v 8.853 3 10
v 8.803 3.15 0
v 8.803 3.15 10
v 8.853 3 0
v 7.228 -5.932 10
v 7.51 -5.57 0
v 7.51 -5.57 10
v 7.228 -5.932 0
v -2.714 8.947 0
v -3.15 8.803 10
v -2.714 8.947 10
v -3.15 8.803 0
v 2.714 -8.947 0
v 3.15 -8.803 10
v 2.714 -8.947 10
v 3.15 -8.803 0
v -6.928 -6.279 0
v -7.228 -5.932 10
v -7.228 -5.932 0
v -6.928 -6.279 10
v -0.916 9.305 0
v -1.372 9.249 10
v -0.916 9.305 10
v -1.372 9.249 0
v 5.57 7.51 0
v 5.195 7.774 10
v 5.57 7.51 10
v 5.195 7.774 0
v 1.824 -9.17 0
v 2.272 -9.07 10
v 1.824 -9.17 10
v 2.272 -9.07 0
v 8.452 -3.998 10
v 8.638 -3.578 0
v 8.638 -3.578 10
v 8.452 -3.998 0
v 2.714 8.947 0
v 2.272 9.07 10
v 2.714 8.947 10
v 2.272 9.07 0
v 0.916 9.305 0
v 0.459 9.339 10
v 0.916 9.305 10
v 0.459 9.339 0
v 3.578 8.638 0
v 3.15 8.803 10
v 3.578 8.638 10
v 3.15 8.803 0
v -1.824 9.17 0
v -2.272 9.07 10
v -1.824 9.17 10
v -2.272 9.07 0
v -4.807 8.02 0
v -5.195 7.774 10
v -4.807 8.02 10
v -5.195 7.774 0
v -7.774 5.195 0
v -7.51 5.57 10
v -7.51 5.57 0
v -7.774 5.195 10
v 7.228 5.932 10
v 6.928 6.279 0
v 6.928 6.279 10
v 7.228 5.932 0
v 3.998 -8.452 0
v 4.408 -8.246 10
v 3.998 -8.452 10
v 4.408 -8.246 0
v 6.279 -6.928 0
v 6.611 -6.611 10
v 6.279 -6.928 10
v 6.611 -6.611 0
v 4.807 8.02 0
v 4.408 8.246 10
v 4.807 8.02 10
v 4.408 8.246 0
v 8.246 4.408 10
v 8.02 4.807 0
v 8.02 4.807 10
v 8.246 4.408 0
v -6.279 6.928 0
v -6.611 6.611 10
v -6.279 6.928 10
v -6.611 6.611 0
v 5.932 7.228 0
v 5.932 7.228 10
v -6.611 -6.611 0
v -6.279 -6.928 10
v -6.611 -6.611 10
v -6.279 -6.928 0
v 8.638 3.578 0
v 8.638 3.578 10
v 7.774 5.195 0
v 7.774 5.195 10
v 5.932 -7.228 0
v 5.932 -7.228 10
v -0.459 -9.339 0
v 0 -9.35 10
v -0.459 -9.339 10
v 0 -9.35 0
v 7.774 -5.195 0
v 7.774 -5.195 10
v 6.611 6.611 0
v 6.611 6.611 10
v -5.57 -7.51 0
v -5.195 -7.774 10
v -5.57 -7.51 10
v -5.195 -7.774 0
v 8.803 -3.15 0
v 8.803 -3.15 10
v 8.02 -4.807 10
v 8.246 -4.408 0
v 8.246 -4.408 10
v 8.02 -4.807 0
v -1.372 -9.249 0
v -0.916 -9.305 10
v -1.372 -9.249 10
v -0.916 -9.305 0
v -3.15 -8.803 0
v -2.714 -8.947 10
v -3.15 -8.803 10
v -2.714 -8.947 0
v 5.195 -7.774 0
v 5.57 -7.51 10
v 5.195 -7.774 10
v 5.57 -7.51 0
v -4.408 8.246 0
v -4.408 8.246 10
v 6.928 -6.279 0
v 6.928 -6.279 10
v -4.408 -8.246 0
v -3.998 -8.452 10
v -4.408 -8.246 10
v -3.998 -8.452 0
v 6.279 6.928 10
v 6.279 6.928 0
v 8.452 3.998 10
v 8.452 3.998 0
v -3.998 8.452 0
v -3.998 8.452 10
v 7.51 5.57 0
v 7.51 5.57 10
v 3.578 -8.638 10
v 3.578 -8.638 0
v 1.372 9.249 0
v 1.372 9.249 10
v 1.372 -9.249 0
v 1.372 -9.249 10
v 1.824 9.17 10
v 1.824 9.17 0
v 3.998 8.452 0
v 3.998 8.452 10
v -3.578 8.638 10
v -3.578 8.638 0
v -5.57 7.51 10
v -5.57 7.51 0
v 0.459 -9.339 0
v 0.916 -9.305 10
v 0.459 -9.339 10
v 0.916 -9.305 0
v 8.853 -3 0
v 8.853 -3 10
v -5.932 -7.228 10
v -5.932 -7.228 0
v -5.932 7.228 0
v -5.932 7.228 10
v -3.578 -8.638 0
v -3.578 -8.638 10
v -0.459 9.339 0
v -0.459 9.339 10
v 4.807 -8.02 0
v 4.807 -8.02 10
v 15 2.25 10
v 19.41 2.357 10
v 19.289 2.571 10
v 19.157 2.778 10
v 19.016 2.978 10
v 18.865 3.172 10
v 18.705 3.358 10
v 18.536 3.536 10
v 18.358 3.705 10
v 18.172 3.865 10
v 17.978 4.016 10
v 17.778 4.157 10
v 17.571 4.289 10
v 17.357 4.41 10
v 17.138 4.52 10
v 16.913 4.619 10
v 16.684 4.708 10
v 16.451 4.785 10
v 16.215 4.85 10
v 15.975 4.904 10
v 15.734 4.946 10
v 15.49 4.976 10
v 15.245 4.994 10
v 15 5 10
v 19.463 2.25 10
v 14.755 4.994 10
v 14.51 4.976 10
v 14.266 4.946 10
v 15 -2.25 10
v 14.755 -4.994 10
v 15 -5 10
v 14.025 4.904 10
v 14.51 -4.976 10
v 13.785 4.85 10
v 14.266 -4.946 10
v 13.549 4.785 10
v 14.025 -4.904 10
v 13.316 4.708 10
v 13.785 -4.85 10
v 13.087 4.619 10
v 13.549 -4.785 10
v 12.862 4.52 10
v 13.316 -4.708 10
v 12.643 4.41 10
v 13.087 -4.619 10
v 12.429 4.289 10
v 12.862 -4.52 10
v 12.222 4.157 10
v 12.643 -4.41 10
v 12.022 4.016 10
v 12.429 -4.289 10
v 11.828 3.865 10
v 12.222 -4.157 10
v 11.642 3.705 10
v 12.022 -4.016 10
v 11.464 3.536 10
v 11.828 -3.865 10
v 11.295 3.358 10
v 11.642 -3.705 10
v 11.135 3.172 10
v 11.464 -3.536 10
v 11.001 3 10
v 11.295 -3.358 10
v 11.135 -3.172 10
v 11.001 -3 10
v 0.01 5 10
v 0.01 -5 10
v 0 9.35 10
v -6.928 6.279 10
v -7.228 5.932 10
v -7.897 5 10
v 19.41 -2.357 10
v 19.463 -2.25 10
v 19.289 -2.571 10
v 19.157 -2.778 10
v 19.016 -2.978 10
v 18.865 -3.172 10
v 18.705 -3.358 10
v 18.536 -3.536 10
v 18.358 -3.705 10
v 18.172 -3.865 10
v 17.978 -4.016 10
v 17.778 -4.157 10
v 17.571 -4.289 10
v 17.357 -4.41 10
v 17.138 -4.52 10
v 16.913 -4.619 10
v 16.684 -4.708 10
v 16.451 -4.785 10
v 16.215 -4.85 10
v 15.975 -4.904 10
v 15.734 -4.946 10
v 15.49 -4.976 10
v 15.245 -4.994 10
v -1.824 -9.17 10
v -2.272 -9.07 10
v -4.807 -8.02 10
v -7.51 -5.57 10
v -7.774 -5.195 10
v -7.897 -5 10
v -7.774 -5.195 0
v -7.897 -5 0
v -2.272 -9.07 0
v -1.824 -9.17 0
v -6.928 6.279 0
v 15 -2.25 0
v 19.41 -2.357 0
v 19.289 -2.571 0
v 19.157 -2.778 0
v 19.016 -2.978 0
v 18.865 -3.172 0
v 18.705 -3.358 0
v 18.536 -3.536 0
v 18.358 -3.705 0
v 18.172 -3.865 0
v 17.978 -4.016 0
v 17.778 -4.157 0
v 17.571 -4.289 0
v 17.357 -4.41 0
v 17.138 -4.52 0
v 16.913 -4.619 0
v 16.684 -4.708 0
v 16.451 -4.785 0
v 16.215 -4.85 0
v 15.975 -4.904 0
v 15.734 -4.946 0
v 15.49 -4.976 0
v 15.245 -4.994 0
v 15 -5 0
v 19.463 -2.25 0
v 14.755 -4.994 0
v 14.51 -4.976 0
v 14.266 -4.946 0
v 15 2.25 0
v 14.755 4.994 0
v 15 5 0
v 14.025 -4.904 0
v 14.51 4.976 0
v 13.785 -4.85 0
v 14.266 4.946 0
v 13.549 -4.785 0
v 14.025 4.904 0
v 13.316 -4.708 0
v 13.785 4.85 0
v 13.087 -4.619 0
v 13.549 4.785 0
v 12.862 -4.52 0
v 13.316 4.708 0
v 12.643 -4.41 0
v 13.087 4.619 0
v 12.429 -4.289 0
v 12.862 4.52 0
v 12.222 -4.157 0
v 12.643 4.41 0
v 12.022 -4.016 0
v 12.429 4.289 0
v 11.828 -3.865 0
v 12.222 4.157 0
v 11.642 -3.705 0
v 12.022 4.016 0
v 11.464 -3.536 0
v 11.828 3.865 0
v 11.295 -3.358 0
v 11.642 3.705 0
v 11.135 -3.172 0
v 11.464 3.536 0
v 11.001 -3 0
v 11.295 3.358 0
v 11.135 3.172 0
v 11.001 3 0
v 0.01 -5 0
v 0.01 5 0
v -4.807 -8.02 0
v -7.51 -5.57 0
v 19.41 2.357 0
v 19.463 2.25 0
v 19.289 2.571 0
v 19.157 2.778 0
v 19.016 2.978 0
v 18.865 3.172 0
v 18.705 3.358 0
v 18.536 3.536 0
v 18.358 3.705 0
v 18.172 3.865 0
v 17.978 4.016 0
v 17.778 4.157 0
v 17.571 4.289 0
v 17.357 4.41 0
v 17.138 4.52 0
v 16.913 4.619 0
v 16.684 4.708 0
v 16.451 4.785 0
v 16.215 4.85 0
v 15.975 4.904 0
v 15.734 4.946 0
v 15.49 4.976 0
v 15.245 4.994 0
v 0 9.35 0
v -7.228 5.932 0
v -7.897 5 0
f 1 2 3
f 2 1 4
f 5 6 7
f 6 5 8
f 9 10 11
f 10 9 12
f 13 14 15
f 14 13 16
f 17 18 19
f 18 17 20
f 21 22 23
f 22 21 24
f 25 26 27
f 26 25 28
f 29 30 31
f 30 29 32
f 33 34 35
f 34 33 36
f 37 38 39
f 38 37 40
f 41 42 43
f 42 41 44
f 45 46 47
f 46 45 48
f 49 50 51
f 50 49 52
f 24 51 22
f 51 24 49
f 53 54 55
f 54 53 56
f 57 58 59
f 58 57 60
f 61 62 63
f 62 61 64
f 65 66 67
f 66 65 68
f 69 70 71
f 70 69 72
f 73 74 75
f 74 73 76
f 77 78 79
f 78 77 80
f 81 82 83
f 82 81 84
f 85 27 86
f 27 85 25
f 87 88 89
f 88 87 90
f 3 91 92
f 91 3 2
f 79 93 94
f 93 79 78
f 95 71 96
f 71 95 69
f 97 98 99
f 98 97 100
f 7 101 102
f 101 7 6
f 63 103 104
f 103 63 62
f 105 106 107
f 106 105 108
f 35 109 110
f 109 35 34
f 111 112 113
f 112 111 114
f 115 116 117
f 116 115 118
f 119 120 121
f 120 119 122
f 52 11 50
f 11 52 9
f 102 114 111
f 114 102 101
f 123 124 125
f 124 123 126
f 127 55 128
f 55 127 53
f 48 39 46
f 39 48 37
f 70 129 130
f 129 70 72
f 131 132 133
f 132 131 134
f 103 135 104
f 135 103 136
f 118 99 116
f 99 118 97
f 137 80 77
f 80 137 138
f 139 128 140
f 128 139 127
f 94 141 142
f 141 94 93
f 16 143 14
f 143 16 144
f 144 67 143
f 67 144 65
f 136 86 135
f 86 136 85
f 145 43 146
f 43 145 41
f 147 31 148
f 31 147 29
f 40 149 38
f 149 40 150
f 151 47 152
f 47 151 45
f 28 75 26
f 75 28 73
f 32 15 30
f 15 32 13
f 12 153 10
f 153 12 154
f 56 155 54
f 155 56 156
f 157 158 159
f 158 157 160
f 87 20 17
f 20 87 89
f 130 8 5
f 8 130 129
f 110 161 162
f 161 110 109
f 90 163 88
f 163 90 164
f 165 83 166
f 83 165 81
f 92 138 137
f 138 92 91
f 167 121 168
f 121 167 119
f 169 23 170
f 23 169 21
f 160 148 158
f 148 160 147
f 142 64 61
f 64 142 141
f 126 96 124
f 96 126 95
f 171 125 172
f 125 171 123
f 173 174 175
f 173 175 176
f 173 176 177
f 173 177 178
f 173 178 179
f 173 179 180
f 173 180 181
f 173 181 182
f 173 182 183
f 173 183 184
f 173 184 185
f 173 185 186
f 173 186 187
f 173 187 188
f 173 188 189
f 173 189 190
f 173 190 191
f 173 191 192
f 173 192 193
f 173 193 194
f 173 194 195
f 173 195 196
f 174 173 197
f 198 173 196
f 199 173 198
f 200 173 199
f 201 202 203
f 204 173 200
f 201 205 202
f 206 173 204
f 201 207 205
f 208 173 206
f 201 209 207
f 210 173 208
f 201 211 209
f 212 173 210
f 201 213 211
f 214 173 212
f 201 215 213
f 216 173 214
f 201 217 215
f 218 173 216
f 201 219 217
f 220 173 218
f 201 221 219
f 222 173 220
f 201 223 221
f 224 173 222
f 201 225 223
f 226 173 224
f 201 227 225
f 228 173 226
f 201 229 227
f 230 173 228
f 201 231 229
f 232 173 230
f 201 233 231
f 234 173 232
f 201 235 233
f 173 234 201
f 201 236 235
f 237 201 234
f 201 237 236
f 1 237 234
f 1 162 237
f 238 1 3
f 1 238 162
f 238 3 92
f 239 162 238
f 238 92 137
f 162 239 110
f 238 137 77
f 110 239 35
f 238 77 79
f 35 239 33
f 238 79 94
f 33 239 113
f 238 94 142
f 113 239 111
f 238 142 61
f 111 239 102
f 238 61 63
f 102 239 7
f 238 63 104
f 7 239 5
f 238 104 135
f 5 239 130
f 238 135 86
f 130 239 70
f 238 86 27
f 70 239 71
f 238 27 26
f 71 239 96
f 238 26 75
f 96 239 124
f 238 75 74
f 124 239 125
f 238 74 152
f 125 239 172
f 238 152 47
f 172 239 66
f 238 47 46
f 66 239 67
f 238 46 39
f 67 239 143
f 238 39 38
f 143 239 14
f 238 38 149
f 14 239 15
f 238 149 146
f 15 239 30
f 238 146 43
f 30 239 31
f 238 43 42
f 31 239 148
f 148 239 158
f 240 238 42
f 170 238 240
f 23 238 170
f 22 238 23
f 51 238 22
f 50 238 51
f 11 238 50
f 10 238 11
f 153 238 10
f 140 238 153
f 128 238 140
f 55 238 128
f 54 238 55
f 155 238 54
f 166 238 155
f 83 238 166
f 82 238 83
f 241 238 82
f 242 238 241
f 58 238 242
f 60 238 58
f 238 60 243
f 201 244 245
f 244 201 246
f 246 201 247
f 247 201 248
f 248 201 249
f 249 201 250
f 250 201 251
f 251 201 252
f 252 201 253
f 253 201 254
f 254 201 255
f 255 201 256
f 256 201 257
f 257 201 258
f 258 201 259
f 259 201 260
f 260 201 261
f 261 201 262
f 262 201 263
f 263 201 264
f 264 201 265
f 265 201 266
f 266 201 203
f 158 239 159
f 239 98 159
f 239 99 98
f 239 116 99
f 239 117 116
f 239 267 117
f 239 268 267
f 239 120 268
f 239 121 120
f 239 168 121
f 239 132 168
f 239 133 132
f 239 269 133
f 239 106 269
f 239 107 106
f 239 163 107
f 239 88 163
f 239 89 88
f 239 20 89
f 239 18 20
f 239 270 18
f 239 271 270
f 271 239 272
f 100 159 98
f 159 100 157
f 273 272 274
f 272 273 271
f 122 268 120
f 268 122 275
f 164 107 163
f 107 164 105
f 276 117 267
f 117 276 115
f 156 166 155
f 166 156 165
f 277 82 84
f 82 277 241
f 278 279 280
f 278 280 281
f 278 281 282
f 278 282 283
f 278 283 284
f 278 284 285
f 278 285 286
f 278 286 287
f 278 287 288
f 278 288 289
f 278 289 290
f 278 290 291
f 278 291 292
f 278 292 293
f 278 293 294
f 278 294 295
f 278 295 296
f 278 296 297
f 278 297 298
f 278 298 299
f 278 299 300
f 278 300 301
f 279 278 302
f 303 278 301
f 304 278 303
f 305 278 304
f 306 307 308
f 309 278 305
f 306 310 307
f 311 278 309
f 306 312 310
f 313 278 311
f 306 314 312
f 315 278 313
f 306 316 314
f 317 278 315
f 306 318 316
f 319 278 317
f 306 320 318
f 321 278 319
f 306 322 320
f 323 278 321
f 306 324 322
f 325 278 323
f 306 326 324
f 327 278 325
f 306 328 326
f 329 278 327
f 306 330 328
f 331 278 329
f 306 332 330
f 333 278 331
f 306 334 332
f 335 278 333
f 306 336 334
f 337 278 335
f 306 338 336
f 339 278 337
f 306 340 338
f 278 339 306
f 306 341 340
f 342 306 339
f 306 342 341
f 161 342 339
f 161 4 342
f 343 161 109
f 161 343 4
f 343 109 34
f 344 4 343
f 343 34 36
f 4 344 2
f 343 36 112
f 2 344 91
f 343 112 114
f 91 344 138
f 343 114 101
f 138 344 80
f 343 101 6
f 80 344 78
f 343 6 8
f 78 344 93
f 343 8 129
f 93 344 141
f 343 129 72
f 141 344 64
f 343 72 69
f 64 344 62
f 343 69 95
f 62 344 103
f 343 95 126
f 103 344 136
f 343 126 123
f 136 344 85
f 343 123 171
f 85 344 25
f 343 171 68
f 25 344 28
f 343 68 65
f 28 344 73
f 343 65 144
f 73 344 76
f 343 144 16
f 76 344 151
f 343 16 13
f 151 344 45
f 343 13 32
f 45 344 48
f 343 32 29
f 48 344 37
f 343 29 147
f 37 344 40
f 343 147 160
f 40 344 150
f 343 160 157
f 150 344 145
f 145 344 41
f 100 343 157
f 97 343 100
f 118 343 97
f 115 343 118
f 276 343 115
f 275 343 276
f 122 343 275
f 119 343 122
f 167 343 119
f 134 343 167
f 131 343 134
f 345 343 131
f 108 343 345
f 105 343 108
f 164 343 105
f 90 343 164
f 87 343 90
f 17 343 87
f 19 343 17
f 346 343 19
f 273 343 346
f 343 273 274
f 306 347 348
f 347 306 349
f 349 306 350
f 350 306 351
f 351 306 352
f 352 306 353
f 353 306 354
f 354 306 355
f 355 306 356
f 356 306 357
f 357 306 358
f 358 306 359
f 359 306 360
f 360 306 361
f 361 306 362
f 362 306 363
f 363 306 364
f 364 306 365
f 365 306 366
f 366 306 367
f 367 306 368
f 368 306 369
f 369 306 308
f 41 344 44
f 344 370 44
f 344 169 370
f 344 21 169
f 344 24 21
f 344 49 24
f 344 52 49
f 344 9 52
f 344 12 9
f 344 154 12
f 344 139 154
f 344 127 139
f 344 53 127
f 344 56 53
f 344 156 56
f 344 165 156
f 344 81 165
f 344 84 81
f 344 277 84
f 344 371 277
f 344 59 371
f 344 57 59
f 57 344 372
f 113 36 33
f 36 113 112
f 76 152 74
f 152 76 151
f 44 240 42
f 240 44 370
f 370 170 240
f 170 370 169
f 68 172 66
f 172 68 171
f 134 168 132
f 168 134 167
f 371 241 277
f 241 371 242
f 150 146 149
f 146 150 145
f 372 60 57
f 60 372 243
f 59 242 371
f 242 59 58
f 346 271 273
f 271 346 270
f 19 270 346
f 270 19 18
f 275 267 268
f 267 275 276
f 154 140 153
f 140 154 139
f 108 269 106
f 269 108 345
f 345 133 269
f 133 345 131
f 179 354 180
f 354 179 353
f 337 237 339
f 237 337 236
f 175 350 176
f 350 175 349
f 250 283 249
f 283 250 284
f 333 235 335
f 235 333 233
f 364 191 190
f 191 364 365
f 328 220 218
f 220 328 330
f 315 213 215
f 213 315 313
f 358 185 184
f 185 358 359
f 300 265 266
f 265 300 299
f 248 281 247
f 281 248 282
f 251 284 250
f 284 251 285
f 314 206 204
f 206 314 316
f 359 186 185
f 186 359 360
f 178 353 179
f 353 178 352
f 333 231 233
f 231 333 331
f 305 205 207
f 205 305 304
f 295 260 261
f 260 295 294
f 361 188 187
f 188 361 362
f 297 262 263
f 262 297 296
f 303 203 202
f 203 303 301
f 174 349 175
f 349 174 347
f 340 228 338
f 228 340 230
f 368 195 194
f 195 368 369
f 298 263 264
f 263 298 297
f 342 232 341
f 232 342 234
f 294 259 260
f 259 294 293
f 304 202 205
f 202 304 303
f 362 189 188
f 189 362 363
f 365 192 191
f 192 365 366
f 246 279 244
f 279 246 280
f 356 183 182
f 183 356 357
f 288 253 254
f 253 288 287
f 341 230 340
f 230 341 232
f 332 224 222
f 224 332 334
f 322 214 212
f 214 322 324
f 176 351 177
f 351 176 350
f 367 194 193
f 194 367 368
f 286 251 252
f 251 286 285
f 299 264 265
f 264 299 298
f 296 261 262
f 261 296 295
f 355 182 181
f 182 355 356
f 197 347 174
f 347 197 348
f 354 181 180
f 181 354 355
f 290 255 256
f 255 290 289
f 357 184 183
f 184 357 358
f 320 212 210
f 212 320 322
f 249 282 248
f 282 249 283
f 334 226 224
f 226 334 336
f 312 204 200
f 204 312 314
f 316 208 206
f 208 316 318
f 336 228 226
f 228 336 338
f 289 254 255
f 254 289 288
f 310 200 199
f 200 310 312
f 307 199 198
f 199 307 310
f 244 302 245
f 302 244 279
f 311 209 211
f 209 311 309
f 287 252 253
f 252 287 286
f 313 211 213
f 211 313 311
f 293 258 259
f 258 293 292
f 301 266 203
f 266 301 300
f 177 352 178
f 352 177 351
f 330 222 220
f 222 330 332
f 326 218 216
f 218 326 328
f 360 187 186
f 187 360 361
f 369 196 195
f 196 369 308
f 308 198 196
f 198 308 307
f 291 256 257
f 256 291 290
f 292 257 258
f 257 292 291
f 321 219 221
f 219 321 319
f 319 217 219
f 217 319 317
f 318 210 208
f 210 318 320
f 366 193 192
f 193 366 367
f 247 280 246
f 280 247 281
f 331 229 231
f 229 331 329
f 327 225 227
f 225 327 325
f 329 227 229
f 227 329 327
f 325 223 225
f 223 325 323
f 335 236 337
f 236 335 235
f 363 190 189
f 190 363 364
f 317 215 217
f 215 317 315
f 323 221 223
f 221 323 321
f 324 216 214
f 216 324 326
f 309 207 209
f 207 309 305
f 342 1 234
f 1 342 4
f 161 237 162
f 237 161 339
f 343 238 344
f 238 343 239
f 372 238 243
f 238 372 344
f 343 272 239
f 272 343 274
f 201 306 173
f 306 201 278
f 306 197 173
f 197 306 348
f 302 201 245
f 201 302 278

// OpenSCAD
// Snap-on clip: holds a piece of tubing next to a 12.7 mm lab stand rod
// Printed flat: 2-D profile in XY, extruded 10 mm in +Z

$fn = 128;

// ---------------- Parameters ----------------
rod_d      = 12.7;              // rod ring inner diameter
rod_wall   = 3;                 // rod ring wall thickness
rod_r      = rod_d / 2 + rod_wall; // rod ring outer radius (18.7)

tub_d      = 6;                 // tubing ring inner diameter
tub_wall   = 2;                 // tubing ring wall thickness
tub_r      = tub_d / 2 + tub_wall;   // tubing ring outer radius (5)

bridge_w   = 6;                 // bridge width in X (from x = 8 to x = 12)
bridge_y   = 6;                 // bridge width in Y

open_rod   = 10;                // rod ring opening width in Y (-5 < y < 5)
open_tub   = 4.5;               // tubing ring opening width in Y (-2.25 < y < 2.25)

clip_h     = 10;                // extrusion height (Z)

eps        = 0.5;               // overshoot for clean cuts

// ---------------- Derived ----------------
rod_od     = 2 * rod_r;         // rod ring outer diameter (18.7)
tub_od     = 2 * tub_r;         // tubing ring outer diameter (6)

// ---------------- Model ----------------
difference() {
    union() {
        // Rod ring
        cylinder(d = rod_od, r = rod_r, h = clip_h);
        // Tubing ring
        translate([15, 0, 0])
            cylinder(d = tub_od, r = tub_r, h = clip_h);
        // Solid bridge between the rings
        translate([8, -bridge_y / 2, 0])
            cube([bridge_w, bridge_y, clip_h]);
    }

    // Rod ring opening: remove everything with x < 0 and -5 < y < 5
    translate([-(rod_r + eps), -open_rod / 2, -eps])
        cube([rod_r + eps + 0.01, open_rod, clip_h + 2 * eps]);

    // Tubing ring opening: remove x > 15 and -2.25 < y < 2.25
    translate([15, -open_tub / 2, -eps])
        cube([tub_r + eps + 0.01, open_tub, clip_h + 2 * eps]);
}
